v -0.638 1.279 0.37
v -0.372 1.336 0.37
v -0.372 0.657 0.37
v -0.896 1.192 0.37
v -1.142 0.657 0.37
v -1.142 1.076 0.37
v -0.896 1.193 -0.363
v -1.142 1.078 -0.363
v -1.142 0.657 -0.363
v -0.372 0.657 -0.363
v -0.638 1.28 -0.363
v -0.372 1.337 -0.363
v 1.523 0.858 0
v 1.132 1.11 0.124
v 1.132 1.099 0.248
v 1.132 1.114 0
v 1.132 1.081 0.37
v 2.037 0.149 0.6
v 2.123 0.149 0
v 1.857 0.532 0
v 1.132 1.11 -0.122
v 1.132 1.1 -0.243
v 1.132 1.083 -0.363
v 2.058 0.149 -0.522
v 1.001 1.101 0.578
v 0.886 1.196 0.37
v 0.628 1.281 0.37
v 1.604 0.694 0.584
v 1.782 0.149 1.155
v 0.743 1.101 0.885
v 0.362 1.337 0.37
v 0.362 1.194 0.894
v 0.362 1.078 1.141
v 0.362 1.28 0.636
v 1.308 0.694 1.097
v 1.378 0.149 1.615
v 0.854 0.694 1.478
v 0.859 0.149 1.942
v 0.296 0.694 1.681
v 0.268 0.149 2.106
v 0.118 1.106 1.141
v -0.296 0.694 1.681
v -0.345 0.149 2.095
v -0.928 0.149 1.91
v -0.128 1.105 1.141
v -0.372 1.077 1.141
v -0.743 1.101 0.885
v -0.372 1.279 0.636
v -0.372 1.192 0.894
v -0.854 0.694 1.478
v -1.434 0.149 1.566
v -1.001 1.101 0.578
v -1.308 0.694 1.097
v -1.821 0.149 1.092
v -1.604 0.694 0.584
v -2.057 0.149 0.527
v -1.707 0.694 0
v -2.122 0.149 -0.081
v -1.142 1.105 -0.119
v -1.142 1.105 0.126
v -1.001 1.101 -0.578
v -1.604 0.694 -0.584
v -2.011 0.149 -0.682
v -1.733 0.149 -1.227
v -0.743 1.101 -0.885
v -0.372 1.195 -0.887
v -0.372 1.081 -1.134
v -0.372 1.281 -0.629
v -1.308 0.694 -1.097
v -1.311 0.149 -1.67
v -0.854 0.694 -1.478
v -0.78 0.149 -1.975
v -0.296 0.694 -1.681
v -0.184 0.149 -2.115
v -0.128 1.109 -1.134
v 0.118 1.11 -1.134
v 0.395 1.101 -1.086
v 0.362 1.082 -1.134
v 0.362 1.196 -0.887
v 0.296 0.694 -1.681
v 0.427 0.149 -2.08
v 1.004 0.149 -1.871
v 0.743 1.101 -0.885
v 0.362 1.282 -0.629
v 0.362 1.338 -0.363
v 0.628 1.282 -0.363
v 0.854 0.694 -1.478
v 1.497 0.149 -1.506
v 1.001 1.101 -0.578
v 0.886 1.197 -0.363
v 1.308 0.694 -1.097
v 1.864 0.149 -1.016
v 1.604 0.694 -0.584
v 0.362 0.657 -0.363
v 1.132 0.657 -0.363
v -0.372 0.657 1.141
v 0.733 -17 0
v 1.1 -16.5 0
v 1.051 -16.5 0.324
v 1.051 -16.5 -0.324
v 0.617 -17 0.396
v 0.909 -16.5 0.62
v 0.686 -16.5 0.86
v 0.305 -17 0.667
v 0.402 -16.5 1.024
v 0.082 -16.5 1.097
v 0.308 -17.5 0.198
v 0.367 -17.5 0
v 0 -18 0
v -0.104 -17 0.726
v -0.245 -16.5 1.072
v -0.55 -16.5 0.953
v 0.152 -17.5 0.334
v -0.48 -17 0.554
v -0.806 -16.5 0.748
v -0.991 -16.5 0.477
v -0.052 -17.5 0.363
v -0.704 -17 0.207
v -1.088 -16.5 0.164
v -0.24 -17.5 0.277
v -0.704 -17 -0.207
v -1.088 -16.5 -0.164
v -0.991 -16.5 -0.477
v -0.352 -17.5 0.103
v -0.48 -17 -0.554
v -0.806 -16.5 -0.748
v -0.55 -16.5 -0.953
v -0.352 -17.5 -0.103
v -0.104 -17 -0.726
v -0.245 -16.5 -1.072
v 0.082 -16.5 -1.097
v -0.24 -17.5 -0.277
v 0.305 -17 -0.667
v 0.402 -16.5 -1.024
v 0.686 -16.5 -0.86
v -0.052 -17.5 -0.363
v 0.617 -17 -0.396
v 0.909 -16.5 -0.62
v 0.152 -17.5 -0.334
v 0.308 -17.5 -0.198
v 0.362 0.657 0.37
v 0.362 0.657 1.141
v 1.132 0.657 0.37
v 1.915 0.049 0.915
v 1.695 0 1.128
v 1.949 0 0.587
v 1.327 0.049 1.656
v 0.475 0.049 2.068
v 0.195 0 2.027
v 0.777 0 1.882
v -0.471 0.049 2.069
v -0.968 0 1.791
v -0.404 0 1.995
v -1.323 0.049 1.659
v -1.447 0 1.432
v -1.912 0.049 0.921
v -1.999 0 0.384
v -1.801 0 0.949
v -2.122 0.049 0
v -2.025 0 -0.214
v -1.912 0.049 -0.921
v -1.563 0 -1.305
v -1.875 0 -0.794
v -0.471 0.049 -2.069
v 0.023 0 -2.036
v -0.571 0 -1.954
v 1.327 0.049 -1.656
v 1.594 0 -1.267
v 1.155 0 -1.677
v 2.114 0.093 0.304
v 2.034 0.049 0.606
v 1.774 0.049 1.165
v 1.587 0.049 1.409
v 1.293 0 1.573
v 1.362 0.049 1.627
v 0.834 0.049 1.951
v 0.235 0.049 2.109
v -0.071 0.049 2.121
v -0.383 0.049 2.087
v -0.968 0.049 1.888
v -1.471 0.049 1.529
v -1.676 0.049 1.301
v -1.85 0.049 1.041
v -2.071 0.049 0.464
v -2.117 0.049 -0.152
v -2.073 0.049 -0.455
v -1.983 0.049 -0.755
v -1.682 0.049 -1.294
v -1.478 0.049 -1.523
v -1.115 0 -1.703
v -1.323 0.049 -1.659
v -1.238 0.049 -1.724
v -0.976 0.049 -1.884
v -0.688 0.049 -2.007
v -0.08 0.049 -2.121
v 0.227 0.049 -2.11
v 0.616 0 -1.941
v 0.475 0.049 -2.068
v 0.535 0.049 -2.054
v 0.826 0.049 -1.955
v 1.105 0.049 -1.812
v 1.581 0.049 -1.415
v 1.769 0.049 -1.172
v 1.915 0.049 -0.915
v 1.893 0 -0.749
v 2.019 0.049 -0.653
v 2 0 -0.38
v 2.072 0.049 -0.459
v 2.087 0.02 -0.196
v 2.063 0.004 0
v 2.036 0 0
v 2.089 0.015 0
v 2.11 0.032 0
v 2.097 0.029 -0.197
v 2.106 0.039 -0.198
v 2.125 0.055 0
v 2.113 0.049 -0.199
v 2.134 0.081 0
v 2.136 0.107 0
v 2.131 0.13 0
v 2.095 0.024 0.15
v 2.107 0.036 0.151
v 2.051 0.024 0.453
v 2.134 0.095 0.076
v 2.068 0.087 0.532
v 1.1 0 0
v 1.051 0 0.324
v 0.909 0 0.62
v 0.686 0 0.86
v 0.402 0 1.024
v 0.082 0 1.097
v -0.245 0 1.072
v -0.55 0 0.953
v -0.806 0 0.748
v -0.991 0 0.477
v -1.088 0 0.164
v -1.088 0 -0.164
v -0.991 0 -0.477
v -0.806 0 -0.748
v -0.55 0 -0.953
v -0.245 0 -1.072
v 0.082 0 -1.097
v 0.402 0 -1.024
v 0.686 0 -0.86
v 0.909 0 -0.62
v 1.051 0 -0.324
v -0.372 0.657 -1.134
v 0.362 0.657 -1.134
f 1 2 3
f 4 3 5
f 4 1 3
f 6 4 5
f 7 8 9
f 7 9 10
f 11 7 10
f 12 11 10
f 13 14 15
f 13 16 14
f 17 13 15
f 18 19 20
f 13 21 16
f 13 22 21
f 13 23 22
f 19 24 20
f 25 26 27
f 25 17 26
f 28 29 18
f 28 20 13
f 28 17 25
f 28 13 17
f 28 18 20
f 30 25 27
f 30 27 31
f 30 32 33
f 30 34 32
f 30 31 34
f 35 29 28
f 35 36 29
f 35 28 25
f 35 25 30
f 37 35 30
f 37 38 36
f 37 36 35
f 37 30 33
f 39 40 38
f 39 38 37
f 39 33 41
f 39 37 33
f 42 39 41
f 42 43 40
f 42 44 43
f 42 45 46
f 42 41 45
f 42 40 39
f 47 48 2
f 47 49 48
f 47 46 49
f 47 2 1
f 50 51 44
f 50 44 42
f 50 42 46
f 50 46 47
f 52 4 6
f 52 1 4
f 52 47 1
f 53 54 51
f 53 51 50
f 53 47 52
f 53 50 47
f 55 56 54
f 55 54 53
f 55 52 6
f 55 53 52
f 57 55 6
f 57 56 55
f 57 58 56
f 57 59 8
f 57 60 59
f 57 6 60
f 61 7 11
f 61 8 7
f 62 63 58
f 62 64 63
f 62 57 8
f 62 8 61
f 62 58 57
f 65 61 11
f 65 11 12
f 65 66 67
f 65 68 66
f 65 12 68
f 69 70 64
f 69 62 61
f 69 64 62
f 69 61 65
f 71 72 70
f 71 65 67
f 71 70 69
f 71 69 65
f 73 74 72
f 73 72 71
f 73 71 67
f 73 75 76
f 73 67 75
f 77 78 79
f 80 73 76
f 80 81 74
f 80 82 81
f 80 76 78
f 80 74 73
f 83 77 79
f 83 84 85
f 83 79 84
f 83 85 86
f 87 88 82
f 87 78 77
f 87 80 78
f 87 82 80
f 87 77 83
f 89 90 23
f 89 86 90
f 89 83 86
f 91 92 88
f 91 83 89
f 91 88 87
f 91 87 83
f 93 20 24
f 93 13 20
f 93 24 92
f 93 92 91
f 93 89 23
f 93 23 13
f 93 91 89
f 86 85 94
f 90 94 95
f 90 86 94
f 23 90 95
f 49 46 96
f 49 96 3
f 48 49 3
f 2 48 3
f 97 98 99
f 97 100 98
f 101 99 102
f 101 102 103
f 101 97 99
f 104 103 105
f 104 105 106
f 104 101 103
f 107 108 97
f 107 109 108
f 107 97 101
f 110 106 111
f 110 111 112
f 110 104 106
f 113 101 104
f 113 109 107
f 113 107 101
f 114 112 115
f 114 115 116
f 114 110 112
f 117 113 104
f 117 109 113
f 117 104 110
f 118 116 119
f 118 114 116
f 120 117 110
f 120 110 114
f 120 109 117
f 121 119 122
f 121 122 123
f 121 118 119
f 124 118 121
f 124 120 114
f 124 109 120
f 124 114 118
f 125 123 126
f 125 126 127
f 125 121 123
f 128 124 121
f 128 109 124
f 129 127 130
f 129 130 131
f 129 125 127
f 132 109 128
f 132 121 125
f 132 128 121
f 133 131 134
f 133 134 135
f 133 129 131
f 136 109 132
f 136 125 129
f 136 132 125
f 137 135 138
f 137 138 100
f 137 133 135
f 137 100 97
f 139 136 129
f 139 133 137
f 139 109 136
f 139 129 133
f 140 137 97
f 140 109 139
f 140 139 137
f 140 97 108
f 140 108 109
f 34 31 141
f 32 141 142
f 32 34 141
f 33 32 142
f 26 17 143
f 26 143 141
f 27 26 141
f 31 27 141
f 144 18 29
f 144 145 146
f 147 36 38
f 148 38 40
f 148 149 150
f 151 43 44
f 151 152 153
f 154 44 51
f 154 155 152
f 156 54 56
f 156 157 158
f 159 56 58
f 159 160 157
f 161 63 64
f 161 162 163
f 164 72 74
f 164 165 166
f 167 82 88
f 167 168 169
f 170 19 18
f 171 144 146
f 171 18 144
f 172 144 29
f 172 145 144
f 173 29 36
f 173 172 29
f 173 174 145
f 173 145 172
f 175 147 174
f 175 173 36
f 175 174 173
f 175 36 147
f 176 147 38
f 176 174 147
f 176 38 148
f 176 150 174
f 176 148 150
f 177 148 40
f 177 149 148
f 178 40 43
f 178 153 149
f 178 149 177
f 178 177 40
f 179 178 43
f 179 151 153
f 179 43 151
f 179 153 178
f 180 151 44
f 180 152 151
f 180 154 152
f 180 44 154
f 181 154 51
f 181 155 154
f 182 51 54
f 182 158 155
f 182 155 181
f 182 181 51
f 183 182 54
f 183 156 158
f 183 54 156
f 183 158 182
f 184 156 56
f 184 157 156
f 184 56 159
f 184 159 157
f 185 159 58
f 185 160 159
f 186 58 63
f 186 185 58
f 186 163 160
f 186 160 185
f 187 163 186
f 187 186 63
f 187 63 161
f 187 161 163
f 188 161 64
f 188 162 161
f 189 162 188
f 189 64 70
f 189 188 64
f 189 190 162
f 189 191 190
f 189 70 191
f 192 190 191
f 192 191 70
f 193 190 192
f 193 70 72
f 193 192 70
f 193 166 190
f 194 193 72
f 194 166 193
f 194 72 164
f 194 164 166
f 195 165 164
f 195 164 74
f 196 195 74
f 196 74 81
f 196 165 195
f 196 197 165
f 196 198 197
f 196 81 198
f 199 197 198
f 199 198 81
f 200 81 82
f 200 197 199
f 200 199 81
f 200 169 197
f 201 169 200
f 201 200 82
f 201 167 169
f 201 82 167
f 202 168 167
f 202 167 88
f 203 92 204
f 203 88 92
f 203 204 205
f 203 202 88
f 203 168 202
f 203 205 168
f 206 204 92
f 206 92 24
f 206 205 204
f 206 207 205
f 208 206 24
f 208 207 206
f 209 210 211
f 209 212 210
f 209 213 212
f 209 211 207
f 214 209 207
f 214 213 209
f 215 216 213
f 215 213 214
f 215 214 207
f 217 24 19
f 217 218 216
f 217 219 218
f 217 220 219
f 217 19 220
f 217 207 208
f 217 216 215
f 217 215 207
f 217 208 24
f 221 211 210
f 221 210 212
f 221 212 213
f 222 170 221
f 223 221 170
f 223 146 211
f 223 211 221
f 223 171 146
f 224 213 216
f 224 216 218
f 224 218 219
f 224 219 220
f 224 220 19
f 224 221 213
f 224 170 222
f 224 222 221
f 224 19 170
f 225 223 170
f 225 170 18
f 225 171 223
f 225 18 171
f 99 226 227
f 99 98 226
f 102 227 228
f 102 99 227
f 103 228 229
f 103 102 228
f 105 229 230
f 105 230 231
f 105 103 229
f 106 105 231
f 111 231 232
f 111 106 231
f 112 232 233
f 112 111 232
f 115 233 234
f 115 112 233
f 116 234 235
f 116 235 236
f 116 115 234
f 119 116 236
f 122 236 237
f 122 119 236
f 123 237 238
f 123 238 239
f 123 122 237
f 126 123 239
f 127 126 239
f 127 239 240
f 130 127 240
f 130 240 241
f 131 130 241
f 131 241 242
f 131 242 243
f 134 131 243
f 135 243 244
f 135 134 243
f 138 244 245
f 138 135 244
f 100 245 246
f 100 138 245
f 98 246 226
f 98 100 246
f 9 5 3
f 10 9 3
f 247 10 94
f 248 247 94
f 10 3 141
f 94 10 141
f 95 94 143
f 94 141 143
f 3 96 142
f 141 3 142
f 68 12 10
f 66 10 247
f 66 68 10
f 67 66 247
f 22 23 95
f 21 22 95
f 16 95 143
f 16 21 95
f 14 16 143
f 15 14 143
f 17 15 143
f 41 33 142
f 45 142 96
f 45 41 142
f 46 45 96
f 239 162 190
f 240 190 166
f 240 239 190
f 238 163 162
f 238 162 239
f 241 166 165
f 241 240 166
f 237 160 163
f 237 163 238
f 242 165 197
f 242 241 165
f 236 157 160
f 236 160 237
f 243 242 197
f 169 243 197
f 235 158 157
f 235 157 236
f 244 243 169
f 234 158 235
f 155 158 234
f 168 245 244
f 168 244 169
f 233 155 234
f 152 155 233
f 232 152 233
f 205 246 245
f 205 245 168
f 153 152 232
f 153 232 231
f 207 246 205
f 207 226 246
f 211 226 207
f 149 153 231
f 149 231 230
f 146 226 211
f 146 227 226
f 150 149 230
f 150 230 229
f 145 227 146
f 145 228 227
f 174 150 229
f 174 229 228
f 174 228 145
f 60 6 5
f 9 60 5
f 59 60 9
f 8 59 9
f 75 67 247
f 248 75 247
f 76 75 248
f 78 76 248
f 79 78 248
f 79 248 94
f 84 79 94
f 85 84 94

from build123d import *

# Parameters (mm, degrees)
CONG_1_R                = 0.1
ENL_V_MAT_EXTRU_1_DEPTH = 0.5


with BuildPart() as part:
    # Esquisse1 → Révolution1 (revolve)
    with BuildSketch(Plane.XY):
        with BuildLine():
            Line((2.2, 0), (1.1, 0))
            Line((1.1, 0), (1.1, -16.5))
            Line((1.1, -16.5), (0, -18))
            Line((0, -18), (0, 1.392961166))
            ThreePointArc((0, 1.392961166), (1.301954378, 1.015441113), (2.2, 0))
        make_face()
    revolve(axis=Axis((0, 3.800054794, 0), (0, -1, 0)))

    # Congé1
    cong_1_edges = [part.edges().sort_by_distance(p)[0] for p in [
        (-2.2, 0, 0),
    ]]
    fillet(cong_1_edges, radius=CONG_1_R)

    # Esquisse2 → Enlèv. mat.-Extru.1 (cut, symmetric)
    with BuildSketch(Plane(origin=(0, 1.15653742, 0), x_dir=(-1, 0, 0), z_dir=(0, 1, 0))):
        Polygon((-0.361948003, 1.140760916), (0.37159995, 1.140760916), (0.37159995, 0.37038863), (1.141972235, 0.37038863), (1.141972235, -0.363159322), (0.37159995, -0.363159322), (0.37159995, -1.133531608), (-0.361948003, -1.133531608), (-0.361948003, -0.363159322), (-1.132320288, -0.363159322), (-1.132320288, 0.37038863), (-0.361948003, 0.37038863), align=None)
    extrude(amount=ENL_V_MAT_EXTRU_1_DEPTH, both=True, mode=Mode.SUBTRACT)


solid = part.part
